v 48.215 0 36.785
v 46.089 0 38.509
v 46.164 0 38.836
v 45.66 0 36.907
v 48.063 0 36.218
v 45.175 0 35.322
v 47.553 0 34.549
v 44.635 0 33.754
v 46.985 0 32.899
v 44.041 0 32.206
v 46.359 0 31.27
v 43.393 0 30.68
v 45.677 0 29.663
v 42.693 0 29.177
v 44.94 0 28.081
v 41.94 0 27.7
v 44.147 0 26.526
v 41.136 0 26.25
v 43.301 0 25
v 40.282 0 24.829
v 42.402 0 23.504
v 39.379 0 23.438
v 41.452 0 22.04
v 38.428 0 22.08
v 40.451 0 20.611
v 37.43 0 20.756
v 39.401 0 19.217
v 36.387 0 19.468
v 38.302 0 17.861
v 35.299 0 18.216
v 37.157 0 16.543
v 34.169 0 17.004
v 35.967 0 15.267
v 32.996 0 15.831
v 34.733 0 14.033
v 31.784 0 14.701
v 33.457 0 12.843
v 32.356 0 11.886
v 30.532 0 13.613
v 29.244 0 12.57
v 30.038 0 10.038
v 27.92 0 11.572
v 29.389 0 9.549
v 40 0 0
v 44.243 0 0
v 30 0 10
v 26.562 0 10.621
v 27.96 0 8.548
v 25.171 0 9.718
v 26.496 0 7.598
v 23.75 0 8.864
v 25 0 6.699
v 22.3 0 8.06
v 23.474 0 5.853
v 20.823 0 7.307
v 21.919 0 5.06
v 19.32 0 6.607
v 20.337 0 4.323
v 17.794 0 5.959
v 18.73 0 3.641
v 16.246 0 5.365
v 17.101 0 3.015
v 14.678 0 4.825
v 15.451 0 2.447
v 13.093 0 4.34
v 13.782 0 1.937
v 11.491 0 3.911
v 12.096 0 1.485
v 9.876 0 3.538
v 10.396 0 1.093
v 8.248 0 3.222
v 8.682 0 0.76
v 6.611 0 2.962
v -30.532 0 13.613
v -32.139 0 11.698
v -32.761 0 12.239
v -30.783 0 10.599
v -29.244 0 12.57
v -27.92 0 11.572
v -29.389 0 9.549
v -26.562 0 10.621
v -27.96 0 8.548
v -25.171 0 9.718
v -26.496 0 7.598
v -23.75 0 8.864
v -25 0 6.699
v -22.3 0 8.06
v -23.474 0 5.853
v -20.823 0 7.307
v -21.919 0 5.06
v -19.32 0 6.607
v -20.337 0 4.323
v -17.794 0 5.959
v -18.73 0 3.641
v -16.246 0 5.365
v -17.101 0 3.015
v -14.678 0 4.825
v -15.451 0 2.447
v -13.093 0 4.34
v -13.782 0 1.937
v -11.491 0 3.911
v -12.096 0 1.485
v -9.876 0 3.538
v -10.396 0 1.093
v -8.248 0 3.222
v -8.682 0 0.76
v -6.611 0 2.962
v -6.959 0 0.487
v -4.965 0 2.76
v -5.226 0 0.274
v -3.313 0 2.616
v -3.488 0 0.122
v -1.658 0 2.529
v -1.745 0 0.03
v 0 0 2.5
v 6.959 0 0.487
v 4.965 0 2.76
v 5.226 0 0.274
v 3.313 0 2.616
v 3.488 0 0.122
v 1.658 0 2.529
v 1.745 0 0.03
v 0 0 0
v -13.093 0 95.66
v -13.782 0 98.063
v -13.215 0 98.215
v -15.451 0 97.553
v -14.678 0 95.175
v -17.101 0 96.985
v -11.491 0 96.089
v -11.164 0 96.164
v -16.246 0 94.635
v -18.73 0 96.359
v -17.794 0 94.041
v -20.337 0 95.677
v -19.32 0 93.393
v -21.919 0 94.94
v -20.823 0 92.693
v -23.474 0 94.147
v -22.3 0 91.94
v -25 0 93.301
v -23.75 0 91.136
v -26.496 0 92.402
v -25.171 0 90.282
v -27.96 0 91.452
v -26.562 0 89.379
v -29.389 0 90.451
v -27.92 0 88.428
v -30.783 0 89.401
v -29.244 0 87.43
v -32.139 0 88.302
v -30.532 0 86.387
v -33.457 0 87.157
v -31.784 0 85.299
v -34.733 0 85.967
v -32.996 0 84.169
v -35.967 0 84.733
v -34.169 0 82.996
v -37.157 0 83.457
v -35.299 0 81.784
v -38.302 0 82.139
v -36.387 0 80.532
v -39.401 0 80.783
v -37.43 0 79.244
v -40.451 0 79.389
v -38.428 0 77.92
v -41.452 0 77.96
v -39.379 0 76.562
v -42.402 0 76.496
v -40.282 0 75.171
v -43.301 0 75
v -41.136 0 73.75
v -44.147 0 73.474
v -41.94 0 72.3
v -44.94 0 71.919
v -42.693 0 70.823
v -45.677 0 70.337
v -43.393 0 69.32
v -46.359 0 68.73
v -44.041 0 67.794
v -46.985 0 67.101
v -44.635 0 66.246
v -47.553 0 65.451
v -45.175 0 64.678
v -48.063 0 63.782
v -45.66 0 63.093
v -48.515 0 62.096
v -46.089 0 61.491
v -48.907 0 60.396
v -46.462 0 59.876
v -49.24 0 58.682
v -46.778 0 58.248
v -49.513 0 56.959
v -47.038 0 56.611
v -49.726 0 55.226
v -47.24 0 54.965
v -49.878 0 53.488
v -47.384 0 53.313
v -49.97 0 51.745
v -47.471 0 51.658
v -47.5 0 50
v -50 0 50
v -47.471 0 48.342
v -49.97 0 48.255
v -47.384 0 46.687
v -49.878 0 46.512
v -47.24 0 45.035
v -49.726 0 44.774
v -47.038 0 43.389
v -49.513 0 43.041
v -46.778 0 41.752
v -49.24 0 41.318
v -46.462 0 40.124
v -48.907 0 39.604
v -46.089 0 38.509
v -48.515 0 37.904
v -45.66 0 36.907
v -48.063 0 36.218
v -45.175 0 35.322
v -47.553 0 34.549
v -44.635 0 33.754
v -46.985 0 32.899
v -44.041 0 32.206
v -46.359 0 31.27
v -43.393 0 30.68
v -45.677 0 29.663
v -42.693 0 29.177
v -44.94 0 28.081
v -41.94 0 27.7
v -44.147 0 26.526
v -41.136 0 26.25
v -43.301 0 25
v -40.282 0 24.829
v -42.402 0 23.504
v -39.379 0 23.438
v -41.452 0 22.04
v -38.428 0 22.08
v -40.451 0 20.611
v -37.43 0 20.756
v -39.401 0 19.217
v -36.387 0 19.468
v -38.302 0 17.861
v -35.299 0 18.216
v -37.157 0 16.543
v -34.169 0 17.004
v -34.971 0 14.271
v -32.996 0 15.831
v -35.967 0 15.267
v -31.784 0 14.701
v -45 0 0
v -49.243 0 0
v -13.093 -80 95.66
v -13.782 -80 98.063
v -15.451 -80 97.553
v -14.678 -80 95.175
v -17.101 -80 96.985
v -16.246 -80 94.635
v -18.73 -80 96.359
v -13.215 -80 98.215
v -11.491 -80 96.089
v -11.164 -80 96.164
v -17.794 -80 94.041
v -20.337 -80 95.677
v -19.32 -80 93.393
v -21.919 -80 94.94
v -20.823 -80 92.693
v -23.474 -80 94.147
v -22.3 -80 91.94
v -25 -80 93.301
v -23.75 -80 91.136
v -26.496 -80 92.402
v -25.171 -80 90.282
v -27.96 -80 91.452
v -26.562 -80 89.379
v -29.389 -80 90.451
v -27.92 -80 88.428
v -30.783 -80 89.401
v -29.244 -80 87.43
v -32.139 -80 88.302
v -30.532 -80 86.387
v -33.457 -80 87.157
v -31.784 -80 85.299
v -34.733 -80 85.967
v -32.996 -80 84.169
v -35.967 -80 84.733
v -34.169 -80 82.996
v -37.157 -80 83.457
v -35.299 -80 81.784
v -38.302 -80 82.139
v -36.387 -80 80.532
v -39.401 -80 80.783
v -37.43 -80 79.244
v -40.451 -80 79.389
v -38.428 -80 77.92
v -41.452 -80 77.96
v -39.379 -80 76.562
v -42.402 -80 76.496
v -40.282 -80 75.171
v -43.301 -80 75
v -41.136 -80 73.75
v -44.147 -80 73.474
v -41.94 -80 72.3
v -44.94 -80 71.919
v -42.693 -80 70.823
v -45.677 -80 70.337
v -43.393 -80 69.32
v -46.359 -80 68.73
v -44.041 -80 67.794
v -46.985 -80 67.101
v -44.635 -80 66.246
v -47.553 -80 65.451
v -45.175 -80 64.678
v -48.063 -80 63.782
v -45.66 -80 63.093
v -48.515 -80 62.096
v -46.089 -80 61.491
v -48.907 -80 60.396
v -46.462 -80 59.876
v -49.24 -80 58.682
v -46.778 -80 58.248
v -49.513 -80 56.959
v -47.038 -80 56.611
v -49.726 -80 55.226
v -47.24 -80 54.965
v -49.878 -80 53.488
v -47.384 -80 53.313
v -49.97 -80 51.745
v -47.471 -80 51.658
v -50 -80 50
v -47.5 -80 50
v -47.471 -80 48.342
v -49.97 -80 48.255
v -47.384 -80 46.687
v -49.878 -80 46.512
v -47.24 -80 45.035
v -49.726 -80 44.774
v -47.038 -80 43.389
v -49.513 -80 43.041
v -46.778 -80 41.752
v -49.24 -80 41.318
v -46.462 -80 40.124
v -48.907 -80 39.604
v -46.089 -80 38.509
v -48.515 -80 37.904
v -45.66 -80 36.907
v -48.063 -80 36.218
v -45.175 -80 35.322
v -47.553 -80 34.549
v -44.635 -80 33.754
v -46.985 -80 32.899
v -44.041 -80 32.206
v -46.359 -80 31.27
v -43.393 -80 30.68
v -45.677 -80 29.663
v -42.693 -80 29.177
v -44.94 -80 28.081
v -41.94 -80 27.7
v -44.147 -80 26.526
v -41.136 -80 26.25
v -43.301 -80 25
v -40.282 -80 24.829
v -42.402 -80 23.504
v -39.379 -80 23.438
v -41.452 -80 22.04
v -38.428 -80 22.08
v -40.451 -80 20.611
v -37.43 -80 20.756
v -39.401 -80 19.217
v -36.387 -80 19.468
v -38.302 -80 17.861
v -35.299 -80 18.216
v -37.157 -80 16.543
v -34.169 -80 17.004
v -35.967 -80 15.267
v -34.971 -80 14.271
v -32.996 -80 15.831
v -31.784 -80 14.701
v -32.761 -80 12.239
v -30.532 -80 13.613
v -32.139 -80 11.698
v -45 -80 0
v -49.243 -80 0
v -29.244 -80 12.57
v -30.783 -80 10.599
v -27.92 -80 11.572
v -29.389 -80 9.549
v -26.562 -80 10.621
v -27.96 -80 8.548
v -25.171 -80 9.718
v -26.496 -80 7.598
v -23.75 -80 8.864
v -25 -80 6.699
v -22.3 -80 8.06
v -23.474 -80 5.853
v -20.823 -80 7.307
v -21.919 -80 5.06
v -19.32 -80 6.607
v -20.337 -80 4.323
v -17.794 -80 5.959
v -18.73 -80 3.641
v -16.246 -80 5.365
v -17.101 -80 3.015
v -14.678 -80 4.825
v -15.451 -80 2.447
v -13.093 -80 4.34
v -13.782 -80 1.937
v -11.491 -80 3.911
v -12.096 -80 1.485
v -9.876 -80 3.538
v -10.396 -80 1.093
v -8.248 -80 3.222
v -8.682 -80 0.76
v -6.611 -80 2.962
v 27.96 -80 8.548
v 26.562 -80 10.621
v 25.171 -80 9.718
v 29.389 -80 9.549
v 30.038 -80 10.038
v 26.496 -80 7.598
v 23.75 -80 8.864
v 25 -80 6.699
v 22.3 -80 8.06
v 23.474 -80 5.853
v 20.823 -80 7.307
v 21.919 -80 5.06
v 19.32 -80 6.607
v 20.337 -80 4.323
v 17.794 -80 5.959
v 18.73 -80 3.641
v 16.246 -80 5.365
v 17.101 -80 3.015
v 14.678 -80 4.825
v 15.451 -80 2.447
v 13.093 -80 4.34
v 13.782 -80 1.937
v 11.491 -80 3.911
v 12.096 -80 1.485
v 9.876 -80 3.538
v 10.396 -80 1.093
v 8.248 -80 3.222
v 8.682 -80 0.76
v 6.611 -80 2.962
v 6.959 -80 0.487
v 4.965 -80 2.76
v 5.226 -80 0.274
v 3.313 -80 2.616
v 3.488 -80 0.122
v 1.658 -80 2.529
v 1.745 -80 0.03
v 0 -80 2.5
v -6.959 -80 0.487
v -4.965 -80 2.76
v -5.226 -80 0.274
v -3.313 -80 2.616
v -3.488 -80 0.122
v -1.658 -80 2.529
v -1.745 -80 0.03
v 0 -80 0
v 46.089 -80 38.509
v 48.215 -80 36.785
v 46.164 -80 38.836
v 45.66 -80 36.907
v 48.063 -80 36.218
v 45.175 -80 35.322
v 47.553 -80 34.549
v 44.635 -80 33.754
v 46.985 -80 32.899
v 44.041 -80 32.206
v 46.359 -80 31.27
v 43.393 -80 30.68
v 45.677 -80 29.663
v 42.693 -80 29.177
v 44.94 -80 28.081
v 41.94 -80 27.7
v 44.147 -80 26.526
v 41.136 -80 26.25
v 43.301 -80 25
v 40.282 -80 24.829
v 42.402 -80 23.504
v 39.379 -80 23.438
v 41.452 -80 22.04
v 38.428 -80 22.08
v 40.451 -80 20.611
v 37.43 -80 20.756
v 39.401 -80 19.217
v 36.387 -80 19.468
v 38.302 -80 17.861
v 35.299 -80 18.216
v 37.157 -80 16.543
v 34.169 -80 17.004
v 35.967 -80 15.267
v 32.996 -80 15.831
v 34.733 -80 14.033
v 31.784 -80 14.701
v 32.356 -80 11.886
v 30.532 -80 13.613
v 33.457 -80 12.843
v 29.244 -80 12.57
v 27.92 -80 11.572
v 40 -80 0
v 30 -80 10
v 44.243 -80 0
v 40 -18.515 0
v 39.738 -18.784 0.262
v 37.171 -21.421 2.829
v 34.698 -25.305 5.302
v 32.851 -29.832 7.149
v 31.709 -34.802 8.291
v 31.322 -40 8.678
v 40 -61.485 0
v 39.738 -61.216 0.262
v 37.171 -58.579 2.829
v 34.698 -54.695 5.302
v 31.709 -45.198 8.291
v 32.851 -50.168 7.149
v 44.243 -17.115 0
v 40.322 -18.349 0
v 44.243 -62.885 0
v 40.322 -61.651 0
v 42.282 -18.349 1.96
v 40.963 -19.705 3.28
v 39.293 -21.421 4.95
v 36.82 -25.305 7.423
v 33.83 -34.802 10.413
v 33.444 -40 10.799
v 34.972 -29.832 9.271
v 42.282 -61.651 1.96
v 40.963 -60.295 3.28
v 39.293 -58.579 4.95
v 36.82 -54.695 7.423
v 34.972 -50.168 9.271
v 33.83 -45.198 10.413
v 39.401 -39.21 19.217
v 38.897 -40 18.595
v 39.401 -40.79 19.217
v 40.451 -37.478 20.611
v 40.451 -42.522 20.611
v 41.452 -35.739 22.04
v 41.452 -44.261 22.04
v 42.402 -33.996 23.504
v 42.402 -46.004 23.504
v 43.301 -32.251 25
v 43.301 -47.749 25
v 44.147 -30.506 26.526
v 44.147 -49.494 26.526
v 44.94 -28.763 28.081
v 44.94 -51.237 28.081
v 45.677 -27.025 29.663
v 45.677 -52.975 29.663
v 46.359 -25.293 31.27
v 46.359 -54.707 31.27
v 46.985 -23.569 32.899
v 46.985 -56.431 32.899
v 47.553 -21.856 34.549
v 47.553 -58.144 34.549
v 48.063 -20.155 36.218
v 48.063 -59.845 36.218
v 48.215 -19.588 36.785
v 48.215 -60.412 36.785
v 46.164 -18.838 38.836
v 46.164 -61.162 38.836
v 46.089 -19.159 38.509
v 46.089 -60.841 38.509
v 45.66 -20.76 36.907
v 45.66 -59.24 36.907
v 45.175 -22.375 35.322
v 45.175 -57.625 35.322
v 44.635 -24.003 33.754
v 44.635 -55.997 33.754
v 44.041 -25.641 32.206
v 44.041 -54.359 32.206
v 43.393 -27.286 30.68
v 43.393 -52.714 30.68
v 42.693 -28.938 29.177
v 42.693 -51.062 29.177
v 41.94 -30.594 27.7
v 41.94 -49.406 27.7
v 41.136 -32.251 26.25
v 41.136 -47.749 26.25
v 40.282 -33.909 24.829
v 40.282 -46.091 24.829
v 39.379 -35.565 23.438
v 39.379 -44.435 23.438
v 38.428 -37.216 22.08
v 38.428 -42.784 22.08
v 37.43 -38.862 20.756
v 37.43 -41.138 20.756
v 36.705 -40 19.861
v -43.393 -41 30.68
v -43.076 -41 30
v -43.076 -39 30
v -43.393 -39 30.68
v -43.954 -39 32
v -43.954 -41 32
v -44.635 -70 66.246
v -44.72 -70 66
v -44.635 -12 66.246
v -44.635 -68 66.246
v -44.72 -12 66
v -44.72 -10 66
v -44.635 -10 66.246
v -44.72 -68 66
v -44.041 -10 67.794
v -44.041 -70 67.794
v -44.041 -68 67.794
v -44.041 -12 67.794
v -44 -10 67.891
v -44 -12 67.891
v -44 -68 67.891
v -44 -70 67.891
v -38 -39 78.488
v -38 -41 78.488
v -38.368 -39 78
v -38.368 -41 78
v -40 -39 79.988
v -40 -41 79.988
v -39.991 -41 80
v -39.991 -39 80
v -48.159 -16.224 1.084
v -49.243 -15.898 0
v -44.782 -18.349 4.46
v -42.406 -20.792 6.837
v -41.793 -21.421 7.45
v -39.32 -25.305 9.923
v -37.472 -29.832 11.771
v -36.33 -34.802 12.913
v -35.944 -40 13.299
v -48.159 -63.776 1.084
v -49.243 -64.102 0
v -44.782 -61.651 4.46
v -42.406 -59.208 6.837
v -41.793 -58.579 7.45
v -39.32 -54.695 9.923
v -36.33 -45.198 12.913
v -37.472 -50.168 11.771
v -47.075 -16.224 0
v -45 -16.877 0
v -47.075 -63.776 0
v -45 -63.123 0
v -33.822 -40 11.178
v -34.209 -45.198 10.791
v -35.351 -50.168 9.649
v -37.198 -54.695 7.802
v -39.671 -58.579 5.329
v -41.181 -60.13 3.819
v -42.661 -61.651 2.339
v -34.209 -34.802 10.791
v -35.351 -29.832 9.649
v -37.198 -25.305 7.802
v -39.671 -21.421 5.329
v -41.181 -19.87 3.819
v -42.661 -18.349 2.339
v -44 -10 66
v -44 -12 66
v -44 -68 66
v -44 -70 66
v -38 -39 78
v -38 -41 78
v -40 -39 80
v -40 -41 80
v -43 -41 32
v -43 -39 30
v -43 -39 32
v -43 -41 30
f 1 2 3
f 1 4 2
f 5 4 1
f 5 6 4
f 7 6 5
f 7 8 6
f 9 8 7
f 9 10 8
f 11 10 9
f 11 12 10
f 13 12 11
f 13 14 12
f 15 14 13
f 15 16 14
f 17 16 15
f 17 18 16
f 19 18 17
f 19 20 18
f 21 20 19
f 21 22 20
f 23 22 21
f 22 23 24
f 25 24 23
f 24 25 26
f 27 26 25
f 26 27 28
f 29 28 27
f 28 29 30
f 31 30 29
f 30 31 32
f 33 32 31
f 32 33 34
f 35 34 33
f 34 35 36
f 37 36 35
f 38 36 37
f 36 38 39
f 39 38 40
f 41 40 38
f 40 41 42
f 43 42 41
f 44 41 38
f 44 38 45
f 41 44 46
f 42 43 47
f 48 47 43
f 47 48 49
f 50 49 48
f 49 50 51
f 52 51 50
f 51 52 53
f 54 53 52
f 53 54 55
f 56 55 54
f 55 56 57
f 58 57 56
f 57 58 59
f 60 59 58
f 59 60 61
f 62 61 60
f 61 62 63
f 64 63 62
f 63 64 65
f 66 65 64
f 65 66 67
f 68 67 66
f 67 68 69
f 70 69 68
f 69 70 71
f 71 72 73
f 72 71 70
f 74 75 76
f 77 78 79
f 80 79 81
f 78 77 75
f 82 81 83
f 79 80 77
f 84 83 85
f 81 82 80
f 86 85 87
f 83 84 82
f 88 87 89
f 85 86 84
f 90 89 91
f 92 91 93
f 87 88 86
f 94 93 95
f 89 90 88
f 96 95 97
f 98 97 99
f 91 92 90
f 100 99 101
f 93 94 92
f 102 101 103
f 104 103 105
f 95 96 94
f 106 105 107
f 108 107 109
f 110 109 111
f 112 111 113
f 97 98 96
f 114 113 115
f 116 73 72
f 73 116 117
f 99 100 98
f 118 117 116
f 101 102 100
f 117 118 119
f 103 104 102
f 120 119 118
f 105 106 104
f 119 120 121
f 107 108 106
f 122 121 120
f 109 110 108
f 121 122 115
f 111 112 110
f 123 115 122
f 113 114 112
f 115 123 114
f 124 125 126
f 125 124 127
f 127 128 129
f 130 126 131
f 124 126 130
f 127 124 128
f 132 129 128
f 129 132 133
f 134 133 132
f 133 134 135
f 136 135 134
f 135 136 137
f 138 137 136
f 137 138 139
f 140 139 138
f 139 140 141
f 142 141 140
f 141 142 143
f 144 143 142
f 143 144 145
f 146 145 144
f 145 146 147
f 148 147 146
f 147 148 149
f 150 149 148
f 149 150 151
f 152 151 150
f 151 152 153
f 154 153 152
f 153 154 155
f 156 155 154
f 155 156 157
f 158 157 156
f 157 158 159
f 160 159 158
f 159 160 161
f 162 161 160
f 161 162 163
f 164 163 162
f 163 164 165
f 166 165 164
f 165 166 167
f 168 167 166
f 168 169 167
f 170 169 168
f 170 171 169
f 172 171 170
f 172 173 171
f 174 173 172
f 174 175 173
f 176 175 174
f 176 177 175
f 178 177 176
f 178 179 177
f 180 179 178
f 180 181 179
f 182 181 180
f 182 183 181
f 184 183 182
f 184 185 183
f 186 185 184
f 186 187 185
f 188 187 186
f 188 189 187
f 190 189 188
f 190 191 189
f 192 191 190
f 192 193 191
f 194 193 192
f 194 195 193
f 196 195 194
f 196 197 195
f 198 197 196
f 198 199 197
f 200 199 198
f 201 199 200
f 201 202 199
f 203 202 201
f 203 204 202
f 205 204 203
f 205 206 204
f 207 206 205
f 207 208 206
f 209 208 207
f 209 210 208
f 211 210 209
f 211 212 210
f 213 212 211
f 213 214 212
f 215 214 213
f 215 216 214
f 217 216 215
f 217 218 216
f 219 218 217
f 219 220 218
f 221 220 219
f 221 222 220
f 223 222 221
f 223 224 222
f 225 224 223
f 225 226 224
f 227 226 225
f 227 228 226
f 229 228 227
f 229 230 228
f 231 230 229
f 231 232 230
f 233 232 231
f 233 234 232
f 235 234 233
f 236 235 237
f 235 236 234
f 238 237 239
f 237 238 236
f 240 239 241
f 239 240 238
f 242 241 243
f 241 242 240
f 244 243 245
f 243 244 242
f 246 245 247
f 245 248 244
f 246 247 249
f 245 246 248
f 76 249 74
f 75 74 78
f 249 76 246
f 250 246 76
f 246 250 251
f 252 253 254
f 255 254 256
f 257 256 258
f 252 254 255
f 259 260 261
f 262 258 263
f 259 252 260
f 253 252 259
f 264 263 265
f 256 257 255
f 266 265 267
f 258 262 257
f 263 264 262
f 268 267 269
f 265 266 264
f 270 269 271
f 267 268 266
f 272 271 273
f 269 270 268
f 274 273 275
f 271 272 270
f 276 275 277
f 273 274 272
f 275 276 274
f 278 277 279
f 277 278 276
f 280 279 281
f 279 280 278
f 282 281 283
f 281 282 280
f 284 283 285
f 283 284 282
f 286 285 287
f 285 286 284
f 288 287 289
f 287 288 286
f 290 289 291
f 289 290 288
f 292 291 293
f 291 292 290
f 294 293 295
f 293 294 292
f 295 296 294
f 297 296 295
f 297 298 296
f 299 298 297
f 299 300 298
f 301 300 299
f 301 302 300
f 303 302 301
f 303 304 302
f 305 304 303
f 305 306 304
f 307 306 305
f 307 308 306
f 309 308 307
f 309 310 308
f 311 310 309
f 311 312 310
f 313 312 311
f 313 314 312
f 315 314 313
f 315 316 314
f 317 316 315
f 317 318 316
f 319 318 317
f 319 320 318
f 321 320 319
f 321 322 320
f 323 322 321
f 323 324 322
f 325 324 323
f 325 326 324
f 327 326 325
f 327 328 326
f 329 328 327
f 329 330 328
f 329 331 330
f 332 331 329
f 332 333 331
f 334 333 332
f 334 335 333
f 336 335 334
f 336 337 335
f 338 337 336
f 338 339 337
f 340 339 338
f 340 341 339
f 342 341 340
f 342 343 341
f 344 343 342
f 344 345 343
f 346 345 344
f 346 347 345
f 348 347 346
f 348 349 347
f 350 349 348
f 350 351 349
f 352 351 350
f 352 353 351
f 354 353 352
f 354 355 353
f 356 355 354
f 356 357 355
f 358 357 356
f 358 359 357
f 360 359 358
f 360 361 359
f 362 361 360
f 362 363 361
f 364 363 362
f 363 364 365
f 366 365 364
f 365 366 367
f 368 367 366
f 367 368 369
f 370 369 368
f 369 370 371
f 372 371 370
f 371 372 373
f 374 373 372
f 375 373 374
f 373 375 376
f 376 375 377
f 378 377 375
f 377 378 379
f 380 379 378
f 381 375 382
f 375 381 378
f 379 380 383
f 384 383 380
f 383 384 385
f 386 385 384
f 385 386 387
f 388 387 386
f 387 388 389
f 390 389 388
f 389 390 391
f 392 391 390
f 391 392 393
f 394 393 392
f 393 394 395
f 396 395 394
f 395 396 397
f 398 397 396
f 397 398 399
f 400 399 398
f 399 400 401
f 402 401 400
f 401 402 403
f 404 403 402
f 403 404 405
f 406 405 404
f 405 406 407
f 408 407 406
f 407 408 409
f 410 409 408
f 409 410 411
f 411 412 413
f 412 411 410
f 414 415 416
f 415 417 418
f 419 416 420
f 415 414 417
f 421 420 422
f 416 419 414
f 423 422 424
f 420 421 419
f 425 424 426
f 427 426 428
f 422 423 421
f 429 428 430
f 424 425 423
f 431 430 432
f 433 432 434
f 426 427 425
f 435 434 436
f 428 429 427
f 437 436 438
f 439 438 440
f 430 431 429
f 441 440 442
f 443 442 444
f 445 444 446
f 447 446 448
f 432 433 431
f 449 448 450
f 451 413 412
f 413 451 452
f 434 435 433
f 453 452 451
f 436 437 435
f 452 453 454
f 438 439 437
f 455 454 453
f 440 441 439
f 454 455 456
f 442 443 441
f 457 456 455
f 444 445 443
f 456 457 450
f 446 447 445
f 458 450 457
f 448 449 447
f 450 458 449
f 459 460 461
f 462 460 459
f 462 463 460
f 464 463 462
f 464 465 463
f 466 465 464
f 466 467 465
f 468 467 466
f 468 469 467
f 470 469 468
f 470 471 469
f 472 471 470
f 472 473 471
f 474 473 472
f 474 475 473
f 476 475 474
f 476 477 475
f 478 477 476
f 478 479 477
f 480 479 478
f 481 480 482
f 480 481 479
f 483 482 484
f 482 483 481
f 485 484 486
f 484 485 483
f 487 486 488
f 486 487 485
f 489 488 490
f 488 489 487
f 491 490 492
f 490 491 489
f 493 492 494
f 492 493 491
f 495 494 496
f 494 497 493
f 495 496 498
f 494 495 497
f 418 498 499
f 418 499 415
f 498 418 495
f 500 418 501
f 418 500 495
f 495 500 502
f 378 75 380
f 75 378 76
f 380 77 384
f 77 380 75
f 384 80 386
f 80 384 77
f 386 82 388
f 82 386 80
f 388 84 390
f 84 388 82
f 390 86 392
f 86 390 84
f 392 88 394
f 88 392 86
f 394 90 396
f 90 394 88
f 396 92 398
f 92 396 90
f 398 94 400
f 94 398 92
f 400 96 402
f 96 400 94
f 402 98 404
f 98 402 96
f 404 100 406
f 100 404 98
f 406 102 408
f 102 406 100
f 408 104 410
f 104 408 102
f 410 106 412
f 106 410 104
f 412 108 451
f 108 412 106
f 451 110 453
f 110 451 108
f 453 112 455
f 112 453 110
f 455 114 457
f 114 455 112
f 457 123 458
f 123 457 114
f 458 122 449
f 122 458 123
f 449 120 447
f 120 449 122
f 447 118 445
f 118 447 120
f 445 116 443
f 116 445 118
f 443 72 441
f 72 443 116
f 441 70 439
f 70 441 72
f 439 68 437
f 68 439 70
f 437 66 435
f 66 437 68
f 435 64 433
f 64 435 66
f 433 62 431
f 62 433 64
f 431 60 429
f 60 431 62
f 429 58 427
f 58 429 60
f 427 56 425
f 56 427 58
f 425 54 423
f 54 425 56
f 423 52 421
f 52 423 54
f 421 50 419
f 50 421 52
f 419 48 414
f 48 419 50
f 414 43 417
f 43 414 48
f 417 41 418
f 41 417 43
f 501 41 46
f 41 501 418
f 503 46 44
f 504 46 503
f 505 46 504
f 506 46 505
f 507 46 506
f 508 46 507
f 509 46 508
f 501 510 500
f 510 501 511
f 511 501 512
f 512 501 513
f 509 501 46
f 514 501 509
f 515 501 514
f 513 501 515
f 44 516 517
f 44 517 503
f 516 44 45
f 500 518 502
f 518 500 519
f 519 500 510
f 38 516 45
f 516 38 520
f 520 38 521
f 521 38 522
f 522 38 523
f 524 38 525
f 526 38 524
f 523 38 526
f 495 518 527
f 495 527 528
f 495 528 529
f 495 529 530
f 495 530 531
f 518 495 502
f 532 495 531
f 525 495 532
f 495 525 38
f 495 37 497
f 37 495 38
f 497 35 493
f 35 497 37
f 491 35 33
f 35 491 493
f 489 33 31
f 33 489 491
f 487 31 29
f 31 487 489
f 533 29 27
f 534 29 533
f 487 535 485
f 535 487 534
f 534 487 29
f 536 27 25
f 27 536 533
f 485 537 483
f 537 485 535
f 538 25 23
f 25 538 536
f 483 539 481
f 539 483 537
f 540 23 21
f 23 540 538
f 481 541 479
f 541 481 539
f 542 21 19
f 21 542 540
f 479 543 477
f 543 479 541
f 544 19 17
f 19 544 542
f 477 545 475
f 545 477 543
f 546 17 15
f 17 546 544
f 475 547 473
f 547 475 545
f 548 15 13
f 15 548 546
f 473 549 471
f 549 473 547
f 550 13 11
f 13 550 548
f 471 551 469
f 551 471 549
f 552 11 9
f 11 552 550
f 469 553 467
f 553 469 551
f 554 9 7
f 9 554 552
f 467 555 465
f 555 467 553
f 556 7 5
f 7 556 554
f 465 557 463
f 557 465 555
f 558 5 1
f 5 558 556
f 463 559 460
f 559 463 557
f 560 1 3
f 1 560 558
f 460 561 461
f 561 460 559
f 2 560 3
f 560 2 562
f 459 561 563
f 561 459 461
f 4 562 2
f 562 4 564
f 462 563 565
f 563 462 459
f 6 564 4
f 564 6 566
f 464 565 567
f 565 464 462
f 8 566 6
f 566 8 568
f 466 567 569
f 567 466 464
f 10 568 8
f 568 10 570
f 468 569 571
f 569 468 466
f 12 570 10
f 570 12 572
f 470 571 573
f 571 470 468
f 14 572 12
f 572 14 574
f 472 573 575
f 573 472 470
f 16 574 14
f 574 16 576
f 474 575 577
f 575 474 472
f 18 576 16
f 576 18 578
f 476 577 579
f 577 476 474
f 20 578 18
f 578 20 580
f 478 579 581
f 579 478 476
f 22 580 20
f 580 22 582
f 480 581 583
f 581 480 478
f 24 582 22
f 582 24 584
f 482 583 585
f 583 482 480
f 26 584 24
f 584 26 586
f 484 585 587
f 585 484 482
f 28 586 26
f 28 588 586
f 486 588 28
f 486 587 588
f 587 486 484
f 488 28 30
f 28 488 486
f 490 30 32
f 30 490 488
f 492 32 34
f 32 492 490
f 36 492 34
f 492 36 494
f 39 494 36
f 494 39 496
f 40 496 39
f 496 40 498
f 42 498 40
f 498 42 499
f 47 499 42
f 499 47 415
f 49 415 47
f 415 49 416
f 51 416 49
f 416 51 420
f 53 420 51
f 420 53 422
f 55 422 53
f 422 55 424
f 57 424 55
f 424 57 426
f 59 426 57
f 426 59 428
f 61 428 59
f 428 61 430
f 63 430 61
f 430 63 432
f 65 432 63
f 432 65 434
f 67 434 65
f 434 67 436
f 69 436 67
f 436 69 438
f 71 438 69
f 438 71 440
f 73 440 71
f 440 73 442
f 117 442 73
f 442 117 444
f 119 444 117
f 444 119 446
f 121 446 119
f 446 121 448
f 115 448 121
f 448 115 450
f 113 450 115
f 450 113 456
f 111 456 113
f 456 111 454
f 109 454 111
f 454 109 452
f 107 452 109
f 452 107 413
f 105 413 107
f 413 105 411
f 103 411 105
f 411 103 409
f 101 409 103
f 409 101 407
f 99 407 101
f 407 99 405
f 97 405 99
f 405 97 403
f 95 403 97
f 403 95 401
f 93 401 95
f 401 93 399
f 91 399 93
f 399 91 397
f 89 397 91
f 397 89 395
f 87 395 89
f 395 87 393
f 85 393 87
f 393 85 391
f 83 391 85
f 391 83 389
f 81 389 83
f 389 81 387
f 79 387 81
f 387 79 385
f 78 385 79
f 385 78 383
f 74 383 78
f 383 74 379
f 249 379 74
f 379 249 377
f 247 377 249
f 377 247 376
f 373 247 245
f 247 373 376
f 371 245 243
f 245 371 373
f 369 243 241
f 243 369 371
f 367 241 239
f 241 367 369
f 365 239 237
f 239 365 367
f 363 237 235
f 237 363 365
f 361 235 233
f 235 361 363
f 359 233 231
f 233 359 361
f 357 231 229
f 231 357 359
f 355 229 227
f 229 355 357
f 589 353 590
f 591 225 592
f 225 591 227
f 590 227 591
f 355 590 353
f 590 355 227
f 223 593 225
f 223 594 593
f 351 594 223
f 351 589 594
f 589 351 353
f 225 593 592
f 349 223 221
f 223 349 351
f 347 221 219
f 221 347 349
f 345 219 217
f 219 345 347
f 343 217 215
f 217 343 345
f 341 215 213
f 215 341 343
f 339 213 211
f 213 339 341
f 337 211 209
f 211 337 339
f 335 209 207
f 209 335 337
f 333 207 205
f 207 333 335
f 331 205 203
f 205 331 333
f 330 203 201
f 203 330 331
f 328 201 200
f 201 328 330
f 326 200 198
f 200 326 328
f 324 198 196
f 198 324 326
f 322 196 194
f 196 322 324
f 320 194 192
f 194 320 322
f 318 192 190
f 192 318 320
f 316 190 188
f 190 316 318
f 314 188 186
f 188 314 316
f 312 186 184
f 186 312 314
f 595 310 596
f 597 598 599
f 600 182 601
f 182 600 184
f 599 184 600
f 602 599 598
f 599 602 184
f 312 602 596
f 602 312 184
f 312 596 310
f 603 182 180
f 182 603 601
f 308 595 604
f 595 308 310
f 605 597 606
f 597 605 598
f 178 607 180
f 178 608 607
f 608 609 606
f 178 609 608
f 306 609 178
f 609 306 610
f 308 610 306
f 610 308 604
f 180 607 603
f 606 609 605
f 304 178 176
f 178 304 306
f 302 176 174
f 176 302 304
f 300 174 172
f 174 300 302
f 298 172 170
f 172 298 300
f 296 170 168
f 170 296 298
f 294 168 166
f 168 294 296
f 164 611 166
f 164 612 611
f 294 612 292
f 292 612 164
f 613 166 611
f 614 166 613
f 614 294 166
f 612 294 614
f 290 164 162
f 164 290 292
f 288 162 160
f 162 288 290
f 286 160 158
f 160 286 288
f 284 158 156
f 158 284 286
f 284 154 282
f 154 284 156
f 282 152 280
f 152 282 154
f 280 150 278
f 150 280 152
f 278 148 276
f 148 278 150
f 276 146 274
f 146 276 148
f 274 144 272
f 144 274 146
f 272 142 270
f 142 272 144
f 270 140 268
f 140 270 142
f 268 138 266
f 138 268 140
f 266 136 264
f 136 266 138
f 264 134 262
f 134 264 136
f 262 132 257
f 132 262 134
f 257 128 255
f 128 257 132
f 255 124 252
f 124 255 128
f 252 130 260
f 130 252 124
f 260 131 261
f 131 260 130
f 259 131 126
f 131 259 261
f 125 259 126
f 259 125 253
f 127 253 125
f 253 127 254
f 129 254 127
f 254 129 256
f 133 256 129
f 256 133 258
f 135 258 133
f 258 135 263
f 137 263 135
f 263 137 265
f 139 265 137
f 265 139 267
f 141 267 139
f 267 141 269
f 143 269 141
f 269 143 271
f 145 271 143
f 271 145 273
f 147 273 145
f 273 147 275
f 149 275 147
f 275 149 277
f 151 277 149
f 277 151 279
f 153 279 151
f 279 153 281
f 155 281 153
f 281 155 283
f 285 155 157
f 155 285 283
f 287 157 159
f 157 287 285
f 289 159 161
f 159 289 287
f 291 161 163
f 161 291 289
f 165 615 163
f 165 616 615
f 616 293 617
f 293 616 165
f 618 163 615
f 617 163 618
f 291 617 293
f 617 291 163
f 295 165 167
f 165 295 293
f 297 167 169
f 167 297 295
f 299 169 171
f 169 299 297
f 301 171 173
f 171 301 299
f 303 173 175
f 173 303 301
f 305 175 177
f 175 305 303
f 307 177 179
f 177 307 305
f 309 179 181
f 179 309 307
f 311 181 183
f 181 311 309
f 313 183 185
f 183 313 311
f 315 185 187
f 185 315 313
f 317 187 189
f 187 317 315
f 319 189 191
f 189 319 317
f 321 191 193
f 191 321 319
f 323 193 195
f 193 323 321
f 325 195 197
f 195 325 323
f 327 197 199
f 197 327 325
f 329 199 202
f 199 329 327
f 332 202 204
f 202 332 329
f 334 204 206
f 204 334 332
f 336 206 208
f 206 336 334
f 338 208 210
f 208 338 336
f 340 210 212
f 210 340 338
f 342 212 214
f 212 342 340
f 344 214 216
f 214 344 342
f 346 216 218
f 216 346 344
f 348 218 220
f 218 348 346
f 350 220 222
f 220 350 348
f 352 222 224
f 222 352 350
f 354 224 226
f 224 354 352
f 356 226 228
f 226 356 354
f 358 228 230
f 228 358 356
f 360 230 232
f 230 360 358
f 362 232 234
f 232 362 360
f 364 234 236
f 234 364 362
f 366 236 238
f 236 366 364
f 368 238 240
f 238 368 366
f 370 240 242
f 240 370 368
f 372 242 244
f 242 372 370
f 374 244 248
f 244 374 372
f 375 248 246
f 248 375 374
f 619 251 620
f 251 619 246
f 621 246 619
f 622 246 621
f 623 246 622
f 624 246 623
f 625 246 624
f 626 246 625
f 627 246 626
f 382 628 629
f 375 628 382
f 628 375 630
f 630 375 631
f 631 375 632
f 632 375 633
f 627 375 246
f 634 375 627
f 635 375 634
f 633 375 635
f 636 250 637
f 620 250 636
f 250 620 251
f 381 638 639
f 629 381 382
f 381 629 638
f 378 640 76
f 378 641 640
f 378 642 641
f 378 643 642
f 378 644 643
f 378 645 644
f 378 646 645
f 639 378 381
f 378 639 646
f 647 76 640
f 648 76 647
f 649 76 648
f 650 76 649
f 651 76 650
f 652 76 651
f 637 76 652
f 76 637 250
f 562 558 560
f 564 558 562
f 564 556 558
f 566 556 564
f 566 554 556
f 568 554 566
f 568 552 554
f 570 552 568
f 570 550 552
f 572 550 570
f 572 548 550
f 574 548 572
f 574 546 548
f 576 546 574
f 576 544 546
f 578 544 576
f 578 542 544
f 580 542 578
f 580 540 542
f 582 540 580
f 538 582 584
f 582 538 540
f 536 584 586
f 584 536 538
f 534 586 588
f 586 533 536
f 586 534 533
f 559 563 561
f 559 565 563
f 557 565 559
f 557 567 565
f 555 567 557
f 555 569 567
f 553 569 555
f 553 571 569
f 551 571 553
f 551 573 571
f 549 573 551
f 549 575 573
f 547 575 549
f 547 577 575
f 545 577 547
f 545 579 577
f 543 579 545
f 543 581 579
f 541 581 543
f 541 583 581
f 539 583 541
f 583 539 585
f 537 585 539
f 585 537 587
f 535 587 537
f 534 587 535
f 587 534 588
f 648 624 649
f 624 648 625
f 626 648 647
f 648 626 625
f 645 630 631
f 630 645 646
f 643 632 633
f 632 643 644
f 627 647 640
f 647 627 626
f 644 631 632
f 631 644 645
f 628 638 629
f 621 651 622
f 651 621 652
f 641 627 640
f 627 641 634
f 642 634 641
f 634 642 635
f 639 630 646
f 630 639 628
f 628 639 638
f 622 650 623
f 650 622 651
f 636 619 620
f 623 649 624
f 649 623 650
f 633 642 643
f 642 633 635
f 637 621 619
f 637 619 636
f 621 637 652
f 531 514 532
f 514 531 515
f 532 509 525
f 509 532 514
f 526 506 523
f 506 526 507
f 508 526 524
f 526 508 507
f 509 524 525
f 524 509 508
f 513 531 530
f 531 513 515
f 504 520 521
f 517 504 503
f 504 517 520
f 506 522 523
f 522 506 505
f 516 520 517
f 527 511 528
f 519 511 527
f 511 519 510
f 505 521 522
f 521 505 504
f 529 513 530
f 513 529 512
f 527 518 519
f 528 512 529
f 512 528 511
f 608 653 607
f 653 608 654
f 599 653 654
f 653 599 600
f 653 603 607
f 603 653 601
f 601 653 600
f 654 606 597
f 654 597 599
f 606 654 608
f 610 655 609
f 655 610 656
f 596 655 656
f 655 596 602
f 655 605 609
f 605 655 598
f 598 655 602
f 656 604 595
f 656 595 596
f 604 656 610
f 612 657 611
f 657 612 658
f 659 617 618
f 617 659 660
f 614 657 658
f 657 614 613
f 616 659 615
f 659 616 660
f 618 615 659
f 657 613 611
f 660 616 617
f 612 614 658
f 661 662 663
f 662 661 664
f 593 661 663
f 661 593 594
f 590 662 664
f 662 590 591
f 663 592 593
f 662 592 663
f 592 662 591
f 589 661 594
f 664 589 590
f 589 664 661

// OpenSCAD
diameter=100;

module bottom(){
    translate([-60,-20,0]) square([200,20]);
}

module triangle() {
   polygon([[30,0],[0,30],[60,30]]);  
}

module heart(s=20) {
  half=s/2;
  square(s);

  translate([half, s, 0]) circle(half, $fn=90);
  translate([s, half, 0]) circle(half, $fn=90);
}

module base() {
    union() {
    translate([0, diameter/2, 0])
    difference() {
      circle(d=diameter, $fn=180);
      circle(d=diameter-5, $fn=180);
      translate([-diameter/20,-diameter/20,0]) square(diameter*2);
      translate([-15,50,0])
        rotate([0,0,-45]) 
          square([diameter,10]);
    }
    
    difference() {
    translate([-50,-5,0]) 
      rotate([0,0,45])
        square([25, 3]);
    bottom();
    }
    difference() {
    translate([30,10,0])
      rotate([0,0,-45])
        square([30, 3]);
     bottom();
    }
    }
}

difference() {
rotate([90,0,0])
 linear_extrude(height=80, slices=180)
   base();

translate([33, -70, 22])
 rotate([120,0,90])
  linear_extrude(height=10)
    triangle();
    
// nice circle cut on leg
translate([-48,-40,-10])
  rotate([0,-45])
    linear_extrude(height=10)
     circle(diameter/4);
// Front leg
translate([48,-40,-10])
  rotate([0,45])
    linear_extrude(height=10)
     circle(diameter/4);

//translate([-58,-40,30])
// rotate([90,-45,90])
//  linear_extrude(25)
//  difference() {
//    heart(s=35);
//    translate([1,1,0]) heart(s=33);
//  };
}


color("black")
 translate([-46,-12,66])
  cube(size=2);
color("black")
 translate([-46,-70,66])
  cube(size=2);

color("blue")
 translate([-40,-41,78])
  cube(size=2);
color("blue")
 translate([-45,-41,30])
  cube(size=2);
